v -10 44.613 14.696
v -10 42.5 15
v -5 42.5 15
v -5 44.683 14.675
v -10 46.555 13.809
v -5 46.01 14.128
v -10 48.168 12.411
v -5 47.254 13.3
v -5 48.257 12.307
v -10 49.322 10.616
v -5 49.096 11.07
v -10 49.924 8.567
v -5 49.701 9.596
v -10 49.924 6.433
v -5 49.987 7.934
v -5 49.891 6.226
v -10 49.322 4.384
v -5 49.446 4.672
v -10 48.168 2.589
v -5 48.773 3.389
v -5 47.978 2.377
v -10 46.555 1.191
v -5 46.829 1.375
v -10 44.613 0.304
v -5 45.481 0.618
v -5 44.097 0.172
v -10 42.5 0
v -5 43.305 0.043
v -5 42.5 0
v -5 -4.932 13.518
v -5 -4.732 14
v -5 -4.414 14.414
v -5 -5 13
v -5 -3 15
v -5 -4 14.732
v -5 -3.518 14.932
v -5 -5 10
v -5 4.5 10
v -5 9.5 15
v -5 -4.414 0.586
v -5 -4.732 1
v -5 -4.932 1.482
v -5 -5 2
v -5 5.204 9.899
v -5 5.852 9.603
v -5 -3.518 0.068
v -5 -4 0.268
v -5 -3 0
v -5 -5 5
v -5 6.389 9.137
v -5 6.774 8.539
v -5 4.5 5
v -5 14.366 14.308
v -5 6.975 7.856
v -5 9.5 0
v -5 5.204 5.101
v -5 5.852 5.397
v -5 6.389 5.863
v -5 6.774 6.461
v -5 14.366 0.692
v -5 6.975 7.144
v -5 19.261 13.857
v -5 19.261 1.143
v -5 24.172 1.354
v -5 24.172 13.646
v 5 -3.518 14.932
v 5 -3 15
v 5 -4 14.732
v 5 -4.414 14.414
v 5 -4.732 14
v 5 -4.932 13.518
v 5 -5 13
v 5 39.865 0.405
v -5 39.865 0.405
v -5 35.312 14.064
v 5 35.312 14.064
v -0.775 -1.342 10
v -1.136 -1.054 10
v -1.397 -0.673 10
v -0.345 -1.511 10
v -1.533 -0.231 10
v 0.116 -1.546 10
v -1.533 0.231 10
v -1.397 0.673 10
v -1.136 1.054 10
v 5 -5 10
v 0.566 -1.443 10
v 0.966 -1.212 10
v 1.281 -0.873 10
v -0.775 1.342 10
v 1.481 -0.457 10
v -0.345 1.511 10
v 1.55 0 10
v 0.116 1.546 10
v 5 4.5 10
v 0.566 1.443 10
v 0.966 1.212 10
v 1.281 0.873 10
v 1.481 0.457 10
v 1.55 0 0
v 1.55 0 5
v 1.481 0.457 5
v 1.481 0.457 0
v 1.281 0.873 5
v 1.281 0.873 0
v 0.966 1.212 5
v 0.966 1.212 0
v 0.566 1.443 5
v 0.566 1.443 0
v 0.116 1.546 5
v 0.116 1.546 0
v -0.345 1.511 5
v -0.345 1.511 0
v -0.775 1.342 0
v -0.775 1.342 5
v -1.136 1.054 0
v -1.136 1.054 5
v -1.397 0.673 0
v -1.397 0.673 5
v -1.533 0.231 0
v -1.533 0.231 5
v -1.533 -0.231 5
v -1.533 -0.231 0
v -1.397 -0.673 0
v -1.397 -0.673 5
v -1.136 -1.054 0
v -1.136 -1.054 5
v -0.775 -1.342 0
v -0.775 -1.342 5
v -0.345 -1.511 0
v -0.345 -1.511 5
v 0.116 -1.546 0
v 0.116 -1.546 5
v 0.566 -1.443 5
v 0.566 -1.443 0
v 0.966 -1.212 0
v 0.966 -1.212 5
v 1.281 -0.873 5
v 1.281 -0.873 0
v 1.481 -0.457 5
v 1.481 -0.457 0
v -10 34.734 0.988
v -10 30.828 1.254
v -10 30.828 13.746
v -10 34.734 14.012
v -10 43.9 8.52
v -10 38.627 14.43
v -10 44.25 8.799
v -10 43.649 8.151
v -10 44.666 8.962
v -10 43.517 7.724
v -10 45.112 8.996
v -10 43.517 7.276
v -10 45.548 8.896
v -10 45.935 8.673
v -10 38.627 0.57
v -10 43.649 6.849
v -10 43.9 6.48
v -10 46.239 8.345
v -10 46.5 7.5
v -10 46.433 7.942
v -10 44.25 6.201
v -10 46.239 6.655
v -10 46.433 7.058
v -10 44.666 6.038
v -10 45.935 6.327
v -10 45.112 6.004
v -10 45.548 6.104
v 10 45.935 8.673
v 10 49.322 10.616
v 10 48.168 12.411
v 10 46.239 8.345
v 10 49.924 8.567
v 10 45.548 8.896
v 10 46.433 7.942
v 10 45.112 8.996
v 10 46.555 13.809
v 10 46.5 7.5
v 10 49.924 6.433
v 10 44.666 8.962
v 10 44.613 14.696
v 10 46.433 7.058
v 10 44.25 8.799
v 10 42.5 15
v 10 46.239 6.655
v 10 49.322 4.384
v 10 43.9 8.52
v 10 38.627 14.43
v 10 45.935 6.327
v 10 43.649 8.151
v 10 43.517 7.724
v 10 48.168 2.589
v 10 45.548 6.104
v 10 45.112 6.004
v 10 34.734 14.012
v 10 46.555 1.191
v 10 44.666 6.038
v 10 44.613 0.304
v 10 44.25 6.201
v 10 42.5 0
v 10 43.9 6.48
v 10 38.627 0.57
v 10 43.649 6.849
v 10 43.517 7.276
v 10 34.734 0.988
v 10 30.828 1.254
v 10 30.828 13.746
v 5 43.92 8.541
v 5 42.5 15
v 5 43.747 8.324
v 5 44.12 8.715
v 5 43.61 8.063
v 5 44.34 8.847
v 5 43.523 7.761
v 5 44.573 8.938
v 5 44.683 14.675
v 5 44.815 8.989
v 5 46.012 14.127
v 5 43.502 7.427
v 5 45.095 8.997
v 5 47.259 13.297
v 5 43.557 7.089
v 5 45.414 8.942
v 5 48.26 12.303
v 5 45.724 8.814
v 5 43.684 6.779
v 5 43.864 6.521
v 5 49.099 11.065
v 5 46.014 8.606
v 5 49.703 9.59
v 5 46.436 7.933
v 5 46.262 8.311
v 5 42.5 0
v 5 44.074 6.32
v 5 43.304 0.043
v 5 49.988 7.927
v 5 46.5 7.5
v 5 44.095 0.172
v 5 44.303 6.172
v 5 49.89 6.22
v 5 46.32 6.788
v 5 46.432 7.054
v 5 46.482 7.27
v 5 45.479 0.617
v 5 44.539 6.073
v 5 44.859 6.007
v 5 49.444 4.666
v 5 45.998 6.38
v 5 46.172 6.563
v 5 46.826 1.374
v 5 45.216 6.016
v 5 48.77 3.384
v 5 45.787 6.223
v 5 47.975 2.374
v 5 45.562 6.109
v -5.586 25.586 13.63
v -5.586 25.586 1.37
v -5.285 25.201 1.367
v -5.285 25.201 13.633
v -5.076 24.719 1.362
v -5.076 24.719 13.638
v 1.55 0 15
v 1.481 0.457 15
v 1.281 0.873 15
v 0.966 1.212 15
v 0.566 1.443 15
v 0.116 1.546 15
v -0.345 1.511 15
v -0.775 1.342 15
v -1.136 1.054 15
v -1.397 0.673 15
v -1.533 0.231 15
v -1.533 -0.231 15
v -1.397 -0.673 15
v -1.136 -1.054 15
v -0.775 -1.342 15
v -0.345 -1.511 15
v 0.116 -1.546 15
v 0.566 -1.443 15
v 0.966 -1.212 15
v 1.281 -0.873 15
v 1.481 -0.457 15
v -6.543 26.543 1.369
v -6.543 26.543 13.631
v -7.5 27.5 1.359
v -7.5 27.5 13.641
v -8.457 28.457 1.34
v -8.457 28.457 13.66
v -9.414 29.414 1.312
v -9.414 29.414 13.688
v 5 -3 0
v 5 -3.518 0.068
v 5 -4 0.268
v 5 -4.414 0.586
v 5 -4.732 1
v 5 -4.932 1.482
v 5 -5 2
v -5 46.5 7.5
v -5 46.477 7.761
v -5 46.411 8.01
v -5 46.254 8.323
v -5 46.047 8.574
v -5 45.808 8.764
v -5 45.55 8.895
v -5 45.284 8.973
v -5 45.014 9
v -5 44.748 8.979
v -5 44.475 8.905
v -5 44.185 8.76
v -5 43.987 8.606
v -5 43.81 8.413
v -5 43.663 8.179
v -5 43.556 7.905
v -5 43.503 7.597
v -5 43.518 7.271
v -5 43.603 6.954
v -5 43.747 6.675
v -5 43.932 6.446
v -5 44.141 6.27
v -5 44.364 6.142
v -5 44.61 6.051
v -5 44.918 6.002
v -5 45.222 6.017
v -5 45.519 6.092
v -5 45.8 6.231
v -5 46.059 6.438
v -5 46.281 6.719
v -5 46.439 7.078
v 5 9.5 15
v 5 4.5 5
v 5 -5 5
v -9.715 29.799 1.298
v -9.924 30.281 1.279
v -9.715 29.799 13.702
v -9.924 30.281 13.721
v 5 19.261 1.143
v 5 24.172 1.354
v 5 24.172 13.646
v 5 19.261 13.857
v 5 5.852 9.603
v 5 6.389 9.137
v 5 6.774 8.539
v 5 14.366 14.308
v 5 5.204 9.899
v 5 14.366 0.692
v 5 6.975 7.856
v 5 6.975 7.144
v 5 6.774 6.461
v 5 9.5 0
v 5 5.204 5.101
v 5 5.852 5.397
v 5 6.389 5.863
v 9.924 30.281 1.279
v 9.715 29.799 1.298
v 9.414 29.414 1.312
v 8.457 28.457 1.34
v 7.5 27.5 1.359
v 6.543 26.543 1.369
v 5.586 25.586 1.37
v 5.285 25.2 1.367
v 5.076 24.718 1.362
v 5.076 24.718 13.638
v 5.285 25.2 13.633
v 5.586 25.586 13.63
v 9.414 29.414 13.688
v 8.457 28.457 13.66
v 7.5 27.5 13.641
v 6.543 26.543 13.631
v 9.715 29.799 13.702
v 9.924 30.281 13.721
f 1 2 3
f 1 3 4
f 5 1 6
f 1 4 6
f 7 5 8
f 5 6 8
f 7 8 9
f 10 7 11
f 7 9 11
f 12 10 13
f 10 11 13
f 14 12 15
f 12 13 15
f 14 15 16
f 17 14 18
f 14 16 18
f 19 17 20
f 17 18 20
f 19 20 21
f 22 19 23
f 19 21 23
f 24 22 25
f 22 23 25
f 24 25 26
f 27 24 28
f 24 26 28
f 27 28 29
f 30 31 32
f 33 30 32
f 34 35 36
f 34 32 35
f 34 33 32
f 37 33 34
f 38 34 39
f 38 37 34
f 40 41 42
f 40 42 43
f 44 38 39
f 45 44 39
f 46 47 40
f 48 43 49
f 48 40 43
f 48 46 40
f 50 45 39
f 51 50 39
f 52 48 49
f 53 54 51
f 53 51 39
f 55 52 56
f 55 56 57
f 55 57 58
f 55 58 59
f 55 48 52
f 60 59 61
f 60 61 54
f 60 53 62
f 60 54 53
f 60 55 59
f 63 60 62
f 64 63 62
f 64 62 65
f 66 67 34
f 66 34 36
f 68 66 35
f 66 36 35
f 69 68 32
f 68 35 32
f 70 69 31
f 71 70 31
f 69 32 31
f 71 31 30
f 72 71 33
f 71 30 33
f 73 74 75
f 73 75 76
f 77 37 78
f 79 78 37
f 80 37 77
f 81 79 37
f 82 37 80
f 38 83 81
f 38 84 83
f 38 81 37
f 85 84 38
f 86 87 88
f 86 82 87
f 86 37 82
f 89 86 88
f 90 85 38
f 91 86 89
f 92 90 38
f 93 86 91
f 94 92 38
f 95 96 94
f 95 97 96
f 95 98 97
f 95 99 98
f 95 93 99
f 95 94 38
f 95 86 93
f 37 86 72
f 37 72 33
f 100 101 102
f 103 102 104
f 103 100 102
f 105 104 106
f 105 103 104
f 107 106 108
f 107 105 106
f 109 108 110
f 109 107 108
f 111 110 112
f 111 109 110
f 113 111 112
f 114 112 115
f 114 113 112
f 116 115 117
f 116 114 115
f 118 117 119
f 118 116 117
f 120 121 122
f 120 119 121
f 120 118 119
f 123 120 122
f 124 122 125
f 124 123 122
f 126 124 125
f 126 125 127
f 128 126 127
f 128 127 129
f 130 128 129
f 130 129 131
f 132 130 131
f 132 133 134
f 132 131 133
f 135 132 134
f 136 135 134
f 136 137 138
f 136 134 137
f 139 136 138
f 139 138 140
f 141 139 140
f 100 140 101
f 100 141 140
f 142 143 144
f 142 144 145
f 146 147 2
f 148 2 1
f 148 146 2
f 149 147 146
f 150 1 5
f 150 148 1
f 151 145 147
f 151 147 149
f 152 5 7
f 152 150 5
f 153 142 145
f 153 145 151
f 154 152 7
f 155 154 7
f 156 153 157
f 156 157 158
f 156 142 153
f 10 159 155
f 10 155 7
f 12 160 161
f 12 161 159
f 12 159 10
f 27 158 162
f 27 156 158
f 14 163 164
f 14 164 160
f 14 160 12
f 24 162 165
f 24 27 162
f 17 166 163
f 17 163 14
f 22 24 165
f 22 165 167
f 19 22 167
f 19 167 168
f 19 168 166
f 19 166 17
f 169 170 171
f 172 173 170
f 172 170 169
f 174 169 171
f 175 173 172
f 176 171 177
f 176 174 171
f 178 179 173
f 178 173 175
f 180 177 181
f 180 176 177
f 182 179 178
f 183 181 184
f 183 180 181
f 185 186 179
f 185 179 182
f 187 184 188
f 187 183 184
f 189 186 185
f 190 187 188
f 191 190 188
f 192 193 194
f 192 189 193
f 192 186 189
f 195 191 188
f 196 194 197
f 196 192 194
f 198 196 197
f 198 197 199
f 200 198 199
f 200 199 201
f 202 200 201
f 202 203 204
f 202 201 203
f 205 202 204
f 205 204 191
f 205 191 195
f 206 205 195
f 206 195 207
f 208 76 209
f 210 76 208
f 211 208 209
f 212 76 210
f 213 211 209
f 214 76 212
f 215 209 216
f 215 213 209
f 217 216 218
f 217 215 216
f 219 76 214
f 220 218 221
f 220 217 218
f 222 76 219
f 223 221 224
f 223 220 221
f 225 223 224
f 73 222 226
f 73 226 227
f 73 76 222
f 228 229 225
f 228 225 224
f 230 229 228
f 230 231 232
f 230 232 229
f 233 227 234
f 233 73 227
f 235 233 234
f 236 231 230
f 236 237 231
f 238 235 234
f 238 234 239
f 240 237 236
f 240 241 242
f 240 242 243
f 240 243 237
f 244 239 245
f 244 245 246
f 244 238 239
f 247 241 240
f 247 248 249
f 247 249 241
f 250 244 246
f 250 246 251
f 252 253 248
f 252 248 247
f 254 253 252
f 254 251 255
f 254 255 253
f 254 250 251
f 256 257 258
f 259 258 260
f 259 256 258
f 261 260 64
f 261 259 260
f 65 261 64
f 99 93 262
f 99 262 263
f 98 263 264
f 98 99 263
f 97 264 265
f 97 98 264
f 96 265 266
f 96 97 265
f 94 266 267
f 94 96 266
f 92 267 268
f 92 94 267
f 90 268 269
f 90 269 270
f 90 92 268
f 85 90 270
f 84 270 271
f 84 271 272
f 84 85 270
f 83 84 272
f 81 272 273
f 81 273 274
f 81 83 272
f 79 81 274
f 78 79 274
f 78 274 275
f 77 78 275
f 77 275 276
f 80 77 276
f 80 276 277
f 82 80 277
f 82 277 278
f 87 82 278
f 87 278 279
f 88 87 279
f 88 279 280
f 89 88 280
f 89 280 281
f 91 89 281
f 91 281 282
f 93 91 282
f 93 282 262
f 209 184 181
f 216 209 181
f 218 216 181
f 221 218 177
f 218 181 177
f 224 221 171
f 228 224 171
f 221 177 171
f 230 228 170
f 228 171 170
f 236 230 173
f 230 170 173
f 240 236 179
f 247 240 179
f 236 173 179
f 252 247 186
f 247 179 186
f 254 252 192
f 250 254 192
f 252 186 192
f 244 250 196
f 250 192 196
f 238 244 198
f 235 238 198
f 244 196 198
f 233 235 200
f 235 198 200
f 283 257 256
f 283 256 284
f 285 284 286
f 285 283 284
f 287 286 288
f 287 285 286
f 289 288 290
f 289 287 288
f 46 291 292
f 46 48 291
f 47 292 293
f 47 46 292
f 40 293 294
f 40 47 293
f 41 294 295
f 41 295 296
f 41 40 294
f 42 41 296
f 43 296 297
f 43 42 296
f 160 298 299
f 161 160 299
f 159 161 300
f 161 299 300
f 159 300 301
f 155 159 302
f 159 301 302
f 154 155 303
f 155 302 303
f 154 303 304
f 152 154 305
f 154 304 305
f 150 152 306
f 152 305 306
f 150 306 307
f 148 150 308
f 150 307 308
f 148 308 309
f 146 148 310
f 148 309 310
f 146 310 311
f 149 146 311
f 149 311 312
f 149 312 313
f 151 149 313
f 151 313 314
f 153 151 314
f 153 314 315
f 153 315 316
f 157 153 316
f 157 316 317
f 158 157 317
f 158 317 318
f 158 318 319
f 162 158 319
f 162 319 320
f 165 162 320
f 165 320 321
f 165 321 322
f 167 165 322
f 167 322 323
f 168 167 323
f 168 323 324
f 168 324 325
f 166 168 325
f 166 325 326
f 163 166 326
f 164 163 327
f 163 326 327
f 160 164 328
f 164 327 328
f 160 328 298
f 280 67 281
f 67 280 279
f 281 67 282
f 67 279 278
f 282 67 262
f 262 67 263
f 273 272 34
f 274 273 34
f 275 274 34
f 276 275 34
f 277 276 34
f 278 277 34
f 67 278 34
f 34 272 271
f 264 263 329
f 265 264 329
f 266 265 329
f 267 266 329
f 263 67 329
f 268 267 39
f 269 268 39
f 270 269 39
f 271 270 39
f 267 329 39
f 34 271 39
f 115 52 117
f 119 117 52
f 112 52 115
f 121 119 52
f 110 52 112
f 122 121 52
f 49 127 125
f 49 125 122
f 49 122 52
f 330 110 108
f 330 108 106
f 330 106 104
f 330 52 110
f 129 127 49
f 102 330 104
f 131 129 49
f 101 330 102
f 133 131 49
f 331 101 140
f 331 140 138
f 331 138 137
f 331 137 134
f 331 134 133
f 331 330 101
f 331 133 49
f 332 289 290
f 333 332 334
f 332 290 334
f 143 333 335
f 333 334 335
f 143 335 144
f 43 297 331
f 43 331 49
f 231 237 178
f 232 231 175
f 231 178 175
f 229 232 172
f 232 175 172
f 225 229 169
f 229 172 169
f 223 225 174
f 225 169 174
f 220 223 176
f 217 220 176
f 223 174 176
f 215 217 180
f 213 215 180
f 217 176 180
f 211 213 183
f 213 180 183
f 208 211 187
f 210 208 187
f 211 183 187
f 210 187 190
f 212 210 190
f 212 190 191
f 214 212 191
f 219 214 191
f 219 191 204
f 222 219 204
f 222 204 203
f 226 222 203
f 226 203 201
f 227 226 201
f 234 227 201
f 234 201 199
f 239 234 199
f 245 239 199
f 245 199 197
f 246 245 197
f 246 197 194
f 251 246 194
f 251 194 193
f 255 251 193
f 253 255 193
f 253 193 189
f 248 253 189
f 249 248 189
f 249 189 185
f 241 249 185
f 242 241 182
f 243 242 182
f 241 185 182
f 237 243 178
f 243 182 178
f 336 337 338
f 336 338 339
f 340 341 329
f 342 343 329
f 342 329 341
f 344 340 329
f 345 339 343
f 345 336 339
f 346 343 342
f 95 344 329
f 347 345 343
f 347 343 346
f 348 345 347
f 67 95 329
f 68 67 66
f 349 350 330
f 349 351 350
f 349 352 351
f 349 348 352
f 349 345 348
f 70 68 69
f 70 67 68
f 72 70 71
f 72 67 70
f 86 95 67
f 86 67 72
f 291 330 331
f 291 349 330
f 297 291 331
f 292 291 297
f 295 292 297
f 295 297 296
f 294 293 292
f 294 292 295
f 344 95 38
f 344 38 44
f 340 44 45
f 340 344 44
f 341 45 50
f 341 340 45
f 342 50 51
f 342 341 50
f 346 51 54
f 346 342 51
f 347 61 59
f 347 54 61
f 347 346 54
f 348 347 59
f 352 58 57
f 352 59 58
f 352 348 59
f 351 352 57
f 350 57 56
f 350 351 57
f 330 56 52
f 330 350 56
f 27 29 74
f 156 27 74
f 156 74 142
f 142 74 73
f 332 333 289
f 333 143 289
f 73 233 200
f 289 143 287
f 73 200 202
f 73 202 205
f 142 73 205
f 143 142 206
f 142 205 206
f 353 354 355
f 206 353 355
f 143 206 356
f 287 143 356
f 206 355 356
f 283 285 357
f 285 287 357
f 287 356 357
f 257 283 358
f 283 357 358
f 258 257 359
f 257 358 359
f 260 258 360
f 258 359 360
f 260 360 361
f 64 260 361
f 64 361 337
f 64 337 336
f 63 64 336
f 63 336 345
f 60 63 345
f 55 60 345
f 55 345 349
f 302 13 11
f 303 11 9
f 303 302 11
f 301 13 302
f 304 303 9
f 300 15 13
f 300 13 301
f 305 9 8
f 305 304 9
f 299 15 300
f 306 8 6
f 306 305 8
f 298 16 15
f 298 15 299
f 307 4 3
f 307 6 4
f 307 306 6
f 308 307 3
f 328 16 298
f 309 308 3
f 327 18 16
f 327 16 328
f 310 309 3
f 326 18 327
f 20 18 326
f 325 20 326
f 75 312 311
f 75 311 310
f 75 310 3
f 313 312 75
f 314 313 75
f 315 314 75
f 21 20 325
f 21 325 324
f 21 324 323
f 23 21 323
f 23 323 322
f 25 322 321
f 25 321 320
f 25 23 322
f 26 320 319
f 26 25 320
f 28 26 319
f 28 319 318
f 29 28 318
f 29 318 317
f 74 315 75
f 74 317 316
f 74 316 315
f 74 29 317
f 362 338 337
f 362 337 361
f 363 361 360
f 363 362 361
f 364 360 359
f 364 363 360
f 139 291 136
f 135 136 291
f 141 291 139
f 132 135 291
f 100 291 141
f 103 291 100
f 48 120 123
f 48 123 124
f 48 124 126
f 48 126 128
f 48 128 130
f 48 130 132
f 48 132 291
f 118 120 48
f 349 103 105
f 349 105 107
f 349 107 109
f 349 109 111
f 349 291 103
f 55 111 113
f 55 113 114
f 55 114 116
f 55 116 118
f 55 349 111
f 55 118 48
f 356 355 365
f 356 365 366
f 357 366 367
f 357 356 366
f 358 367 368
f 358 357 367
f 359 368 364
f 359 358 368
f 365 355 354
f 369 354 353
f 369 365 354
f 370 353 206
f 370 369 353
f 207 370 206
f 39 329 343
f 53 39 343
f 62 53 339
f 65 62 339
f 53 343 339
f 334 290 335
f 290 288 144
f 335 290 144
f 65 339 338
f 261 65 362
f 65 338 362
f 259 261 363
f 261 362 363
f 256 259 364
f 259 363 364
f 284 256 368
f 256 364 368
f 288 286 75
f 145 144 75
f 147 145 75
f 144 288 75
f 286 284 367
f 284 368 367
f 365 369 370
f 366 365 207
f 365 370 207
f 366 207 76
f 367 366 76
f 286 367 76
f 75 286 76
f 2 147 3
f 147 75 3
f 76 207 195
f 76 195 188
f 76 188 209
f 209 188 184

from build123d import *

# Parameters (mm, degrees)
CROQUIS1_R              = 1.55
SALIENTE_EXTRUIR1_DEPTH = 15
REDONDEO1_R             = 2
CROQUIS10_R             = 1.5
CORTAR_EXTRUIR1_DEPTH   = 56.90169959


with BuildPart() as part:
    # Croquis1 → Saliente-Extruir1 (new body)
    with BuildSketch(Plane.XY):
        Polygon((-5, 25), (-10, 30), (-10, 50), (10, 50), (10, 30), (5, 25), (5, -5), (-5, -5), align=None)
        Circle(CROQUIS1_R, mode=Mode.SUBTRACT)
    extrude(amount=SALIENTE_EXTRUIR1_DEPTH)

    # Croquis8 → Cortar-Recubrir1 section 0
    with BuildSketch(Plane.XY.offset(15)):
        with BuildLine():
            Line((5, 50), (-5, 50))
            Line((-5, 50), (-5, 35))
            Line((-5, 35), (5, 35))
            Line((5, 35), (5, 50))
        make_face()
    # Croquis9 → Cortar-Recubrir1 section 1
    with BuildSketch(Plane(origin=(0, 0, 0), x_dir=(-1, 0, 0), z_dir=(0, 0, -1))):
        with BuildLine():
            Line((5, 50), (-5, 50))
            Line((-5, 50), (-5, 40))
            Line((-5, 40), (5, 40))
            Line((5, 40), (5, 50))
        make_face()
    loft(mode=Mode.SUBTRACT)

    # Redondeo1
    redondeo1_edges = [part.edges().sort_by_distance(p)[0] for p in [
        (0, -5, 0),
        (5, 25, 7.5),
        (-5, 25, 7.5),
        (-10, 30, 7.5),
        (10, 30, 7.5),
        (0, -5, 15),
    ]]
    fillet(redondeo1_edges, radius=REDONDEO1_R)

    # Croquis10 → Cortar-Extruir1 (cut, through all)
    with BuildSketch(Plane(origin=(10, 0, 0), x_dir=(0, 0, -1), z_dir=(1, 0, 0))):
        with Locations(Location((-7.5, 45, 0), (0, 0, 90))):
            Circle(CROQUIS10_R)
        with BuildLine():
            Line((-10, -5), (-10, 4.5))
            ThreePointArc((-10, 4.5), (-7.5, 7), (-5, 4.5))
            Line((-5, 4.5), (-5, -5))
            ThreePointArc((-5, -5), (-7.5, -7.5), (-10, -5))
        make_face()
        with BuildLine():
            Line((-17.5, 9.5), (-15, 9.5))
            ThreePointArc((-15, 9.5), (-13.629356685, 26), (-15, 42.5))
            ThreePointArc((-15, 42.5), (-7.5, 50), (0, 42.5))
            ThreePointArc((0, 42.5), (-1.370643315, 26), (0, 9.5))
            Line((0, 9.5), (2.5, 9.5))
            Line((2.5, 9.5), (2.5, 51.5))
            Line((2.5, 51.5), (-17.5, 51.5))
            Line((-17.5, 51.5), (-17.5, 9.5))
        make_face()
    extrude(amount=-CORTAR_EXTRUIR1_DEPTH, mode=Mode.SUBTRACT)


solid = part.part
